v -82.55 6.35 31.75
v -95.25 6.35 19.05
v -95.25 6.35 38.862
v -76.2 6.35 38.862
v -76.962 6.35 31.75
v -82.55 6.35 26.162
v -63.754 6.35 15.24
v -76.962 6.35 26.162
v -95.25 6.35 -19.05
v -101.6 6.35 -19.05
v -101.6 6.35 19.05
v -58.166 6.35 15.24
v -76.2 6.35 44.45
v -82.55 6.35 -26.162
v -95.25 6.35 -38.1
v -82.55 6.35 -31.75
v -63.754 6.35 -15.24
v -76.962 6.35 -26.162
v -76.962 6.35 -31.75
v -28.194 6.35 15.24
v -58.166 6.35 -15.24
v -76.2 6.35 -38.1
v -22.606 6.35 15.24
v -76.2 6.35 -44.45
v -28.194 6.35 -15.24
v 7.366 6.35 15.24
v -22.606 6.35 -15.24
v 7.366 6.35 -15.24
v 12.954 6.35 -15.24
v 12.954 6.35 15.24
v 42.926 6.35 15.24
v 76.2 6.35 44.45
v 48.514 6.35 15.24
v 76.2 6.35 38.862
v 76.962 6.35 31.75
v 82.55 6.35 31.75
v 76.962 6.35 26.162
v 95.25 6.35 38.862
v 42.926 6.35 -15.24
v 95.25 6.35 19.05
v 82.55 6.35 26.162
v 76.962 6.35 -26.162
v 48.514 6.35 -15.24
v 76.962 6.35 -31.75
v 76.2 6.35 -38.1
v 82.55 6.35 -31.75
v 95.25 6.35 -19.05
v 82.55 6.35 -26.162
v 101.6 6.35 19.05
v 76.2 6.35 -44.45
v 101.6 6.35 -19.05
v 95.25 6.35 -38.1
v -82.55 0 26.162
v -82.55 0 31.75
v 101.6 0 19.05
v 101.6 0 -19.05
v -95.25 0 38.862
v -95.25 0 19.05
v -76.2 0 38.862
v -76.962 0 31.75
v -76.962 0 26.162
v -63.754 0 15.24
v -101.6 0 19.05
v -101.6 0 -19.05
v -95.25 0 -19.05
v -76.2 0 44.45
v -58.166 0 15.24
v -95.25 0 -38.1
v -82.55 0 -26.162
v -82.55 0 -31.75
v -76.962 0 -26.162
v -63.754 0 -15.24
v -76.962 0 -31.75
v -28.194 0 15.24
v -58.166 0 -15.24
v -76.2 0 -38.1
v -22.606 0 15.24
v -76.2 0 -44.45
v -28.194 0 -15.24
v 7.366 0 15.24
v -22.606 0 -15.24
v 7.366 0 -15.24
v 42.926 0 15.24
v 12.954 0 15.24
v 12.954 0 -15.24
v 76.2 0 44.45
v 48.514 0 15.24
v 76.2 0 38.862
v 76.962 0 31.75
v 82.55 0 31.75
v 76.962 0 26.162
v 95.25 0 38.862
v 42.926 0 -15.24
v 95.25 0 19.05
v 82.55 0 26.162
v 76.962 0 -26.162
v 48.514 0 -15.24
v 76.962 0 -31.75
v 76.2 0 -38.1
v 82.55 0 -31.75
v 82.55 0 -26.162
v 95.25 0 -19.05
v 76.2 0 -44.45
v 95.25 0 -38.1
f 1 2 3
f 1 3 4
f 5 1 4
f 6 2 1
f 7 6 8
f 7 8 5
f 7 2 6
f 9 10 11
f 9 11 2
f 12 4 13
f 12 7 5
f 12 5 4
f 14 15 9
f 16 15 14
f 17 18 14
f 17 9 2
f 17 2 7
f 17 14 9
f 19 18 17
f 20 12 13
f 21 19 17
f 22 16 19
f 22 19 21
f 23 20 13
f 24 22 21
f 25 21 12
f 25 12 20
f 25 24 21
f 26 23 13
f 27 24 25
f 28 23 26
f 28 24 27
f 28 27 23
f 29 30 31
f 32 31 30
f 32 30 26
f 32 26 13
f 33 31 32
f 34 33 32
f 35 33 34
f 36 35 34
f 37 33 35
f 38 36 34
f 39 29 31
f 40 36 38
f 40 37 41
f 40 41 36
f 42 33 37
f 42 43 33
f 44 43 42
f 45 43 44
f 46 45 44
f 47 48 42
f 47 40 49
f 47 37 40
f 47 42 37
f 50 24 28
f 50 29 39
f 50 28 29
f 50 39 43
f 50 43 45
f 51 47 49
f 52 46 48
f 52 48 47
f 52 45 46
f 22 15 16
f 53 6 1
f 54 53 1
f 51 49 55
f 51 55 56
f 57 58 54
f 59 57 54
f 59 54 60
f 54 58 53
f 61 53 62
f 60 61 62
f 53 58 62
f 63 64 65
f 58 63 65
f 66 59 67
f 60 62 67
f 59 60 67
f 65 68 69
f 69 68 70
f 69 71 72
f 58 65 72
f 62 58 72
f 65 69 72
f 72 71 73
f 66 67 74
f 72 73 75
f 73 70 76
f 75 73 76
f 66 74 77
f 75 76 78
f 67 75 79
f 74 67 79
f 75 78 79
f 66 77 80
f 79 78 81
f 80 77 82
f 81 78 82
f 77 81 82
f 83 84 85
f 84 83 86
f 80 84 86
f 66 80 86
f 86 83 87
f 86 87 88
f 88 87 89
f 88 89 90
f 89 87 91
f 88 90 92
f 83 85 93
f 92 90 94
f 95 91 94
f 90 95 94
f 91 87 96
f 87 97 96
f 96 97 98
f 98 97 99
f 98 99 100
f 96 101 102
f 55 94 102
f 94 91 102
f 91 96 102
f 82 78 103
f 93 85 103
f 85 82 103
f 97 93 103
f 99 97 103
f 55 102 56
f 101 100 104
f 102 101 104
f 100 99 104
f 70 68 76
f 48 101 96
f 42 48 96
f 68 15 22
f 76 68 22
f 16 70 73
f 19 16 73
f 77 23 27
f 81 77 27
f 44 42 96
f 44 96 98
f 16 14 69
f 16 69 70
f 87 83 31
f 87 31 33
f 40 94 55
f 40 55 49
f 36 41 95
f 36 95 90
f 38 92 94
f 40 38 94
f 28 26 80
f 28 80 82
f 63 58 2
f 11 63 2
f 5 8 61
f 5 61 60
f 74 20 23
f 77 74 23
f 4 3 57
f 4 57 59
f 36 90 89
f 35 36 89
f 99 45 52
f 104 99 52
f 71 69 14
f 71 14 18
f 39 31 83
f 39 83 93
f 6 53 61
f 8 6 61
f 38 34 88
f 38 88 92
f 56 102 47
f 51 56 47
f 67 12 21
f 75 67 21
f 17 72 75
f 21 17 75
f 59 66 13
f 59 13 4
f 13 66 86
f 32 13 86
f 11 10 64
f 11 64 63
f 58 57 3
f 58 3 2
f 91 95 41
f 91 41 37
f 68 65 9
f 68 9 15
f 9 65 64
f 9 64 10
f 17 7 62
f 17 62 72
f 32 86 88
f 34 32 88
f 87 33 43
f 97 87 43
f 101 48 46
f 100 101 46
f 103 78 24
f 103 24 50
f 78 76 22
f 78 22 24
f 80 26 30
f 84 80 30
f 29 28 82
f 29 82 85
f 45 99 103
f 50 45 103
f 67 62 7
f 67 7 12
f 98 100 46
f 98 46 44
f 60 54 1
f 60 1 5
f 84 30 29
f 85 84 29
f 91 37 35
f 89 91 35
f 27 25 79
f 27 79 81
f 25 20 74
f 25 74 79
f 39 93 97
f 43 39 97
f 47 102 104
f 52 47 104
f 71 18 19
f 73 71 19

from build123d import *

# Parameters (mm, degrees)
SKETCH1_W               = 190.5
SKETCH1_H               = 88.9
BOSS_EXTRUDE1_DEPTH     = 6.35
SKETCH2_W               = 5.588
SKETCH2_H               = 30.48
HOLE_DEPTH              = 6.35
SKETCH3_W               = 38.1
SKETCH3_H               = 6.35
TAB1_DEPTH              = 6.35
SKETCH4_W               = 38.1
SKETCH4_H               = 6.35
TAB2_DEPTH              = 6.35
SKETCH5_W               = 5.588
SKETCH5_H               = 5.588
DOWEL1_DEPTH            = 6.35
MIRROR2_COPY_1_SKETCH_W = 5.588
MIRROR2_COPY_1_SKETCH_H = 5.588
MIRROR2_COPY_1_DEPTH    = 6.35
SKETCH6_W               = 19.05
SKETCH6_H               = 5.588
SKETCH6_H_2             = 6.35
CUT_EXTRUDE1_DEPTH      = 7.35


with BuildPart() as part:
    # Sketch1 → Boss-Extrude1 (new body)
    with BuildSketch(Plane(origin=(0, 0, 0), x_dir=(1, 0, 0), z_dir=(0, 1, 0))):
        Rectangle(SKETCH1_W, SKETCH1_H)
    extrude(amount=BOSS_EXTRUDE1_DEPTH)

    # Sketch2 → hole (cut)
    with BuildSketch(Plane(origin=(0, 6.35, 0), x_dir=(1, 0, 0), z_dir=(0, 1, 0))):
        with Locations((-60.96, 0)):
            Rectangle(SKETCH2_W, SKETCH2_H)
        with Locations((-25.4, 0)):
            Rectangle(SKETCH2_W, SKETCH2_H)
        with Locations((10.16, 0)):
            Rectangle(SKETCH2_W, SKETCH2_H)
        with Locations((45.72, 0)):
            Rectangle(SKETCH2_W, SKETCH2_H)
    extrude(amount=-HOLE_DEPTH, mode=Mode.SUBTRACT)

    # Sketch3 → tab1 (add)
    with BuildSketch(Plane.ZY.offset(95.25)):
        with Locations((0, 3.175)):
            Rectangle(SKETCH3_W, SKETCH3_H)
    extrude(amount=TAB1_DEPTH)

    # Sketch4 → tab2 (add)
    with BuildSketch(Plane(origin=(95.25, 0, 0), x_dir=(0, 0, -1), z_dir=(1, 0, 0))):
        with Locations((0, 3.175)):
            Rectangle(SKETCH4_W, SKETCH4_H)
    extrude(amount=TAB2_DEPTH)

    # Sketch5 → dowel1 (cut)
    with BuildSketch(Plane(origin=(0, 6.35, 0), x_dir=(1, 0, 0), z_dir=(0, 1, 0))):
        with Locations((-79.756, 28.956)):
            Rectangle(SKETCH5_W, SKETCH5_H)
    dowel1 = extrude(amount=-DOWEL1_DEPTH, mode=Mode.SUBTRACT)

    # Mirror1: dowel1 across plane
    add(dowel1.mirror(Plane(origin=(0, 0, 0), x_dir=(0, 0, 1), z_dir=(1, 0, 0))), mode=Mode.SUBTRACT)

    # Mirror2: dowel1 across plane
    add(dowel1.mirror(Plane.XY), mode=Mode.SUBTRACT)

    # Mirror2 copy 1 sketch → Mirror2 copy 1 (cut)
    with BuildSketch(Plane(origin=(0, 6.35, 0), x_dir=(-1, 0, 0), z_dir=(0, 1, 0))):
        with Locations((-79.756, 28.956)):
            Rectangle(MIRROR2_COPY_1_SKETCH_W, MIRROR2_COPY_1_SKETCH_H)
    extrude(amount=-MIRROR2_COPY_1_DEPTH, mode=Mode.SUBTRACT)

    # Sketch6 → Cut-Extrude1 (cut, through all)
    with BuildSketch(Plane(origin=(0, 6.35, 0), x_dir=(1, 0, 0), z_dir=(0, 1, 0))):
        with Locations((-85.725, -41.656)):
            Rectangle(SKETCH6_W, SKETCH6_H)
        with Locations((85.725, -41.656)):
            Rectangle(SKETCH6_W, SKETCH6_H)
        with Locations((-85.725, 41.275)):
            Rectangle(SKETCH6_W, SKETCH6_H_2)
        with Locations((85.725, 41.275)):
            Rectangle(SKETCH6_W, SKETCH6_H_2)
    extrude(amount=-CUT_EXTRUDE1_DEPTH, mode=Mode.SUBTRACT)


solid = part.part
